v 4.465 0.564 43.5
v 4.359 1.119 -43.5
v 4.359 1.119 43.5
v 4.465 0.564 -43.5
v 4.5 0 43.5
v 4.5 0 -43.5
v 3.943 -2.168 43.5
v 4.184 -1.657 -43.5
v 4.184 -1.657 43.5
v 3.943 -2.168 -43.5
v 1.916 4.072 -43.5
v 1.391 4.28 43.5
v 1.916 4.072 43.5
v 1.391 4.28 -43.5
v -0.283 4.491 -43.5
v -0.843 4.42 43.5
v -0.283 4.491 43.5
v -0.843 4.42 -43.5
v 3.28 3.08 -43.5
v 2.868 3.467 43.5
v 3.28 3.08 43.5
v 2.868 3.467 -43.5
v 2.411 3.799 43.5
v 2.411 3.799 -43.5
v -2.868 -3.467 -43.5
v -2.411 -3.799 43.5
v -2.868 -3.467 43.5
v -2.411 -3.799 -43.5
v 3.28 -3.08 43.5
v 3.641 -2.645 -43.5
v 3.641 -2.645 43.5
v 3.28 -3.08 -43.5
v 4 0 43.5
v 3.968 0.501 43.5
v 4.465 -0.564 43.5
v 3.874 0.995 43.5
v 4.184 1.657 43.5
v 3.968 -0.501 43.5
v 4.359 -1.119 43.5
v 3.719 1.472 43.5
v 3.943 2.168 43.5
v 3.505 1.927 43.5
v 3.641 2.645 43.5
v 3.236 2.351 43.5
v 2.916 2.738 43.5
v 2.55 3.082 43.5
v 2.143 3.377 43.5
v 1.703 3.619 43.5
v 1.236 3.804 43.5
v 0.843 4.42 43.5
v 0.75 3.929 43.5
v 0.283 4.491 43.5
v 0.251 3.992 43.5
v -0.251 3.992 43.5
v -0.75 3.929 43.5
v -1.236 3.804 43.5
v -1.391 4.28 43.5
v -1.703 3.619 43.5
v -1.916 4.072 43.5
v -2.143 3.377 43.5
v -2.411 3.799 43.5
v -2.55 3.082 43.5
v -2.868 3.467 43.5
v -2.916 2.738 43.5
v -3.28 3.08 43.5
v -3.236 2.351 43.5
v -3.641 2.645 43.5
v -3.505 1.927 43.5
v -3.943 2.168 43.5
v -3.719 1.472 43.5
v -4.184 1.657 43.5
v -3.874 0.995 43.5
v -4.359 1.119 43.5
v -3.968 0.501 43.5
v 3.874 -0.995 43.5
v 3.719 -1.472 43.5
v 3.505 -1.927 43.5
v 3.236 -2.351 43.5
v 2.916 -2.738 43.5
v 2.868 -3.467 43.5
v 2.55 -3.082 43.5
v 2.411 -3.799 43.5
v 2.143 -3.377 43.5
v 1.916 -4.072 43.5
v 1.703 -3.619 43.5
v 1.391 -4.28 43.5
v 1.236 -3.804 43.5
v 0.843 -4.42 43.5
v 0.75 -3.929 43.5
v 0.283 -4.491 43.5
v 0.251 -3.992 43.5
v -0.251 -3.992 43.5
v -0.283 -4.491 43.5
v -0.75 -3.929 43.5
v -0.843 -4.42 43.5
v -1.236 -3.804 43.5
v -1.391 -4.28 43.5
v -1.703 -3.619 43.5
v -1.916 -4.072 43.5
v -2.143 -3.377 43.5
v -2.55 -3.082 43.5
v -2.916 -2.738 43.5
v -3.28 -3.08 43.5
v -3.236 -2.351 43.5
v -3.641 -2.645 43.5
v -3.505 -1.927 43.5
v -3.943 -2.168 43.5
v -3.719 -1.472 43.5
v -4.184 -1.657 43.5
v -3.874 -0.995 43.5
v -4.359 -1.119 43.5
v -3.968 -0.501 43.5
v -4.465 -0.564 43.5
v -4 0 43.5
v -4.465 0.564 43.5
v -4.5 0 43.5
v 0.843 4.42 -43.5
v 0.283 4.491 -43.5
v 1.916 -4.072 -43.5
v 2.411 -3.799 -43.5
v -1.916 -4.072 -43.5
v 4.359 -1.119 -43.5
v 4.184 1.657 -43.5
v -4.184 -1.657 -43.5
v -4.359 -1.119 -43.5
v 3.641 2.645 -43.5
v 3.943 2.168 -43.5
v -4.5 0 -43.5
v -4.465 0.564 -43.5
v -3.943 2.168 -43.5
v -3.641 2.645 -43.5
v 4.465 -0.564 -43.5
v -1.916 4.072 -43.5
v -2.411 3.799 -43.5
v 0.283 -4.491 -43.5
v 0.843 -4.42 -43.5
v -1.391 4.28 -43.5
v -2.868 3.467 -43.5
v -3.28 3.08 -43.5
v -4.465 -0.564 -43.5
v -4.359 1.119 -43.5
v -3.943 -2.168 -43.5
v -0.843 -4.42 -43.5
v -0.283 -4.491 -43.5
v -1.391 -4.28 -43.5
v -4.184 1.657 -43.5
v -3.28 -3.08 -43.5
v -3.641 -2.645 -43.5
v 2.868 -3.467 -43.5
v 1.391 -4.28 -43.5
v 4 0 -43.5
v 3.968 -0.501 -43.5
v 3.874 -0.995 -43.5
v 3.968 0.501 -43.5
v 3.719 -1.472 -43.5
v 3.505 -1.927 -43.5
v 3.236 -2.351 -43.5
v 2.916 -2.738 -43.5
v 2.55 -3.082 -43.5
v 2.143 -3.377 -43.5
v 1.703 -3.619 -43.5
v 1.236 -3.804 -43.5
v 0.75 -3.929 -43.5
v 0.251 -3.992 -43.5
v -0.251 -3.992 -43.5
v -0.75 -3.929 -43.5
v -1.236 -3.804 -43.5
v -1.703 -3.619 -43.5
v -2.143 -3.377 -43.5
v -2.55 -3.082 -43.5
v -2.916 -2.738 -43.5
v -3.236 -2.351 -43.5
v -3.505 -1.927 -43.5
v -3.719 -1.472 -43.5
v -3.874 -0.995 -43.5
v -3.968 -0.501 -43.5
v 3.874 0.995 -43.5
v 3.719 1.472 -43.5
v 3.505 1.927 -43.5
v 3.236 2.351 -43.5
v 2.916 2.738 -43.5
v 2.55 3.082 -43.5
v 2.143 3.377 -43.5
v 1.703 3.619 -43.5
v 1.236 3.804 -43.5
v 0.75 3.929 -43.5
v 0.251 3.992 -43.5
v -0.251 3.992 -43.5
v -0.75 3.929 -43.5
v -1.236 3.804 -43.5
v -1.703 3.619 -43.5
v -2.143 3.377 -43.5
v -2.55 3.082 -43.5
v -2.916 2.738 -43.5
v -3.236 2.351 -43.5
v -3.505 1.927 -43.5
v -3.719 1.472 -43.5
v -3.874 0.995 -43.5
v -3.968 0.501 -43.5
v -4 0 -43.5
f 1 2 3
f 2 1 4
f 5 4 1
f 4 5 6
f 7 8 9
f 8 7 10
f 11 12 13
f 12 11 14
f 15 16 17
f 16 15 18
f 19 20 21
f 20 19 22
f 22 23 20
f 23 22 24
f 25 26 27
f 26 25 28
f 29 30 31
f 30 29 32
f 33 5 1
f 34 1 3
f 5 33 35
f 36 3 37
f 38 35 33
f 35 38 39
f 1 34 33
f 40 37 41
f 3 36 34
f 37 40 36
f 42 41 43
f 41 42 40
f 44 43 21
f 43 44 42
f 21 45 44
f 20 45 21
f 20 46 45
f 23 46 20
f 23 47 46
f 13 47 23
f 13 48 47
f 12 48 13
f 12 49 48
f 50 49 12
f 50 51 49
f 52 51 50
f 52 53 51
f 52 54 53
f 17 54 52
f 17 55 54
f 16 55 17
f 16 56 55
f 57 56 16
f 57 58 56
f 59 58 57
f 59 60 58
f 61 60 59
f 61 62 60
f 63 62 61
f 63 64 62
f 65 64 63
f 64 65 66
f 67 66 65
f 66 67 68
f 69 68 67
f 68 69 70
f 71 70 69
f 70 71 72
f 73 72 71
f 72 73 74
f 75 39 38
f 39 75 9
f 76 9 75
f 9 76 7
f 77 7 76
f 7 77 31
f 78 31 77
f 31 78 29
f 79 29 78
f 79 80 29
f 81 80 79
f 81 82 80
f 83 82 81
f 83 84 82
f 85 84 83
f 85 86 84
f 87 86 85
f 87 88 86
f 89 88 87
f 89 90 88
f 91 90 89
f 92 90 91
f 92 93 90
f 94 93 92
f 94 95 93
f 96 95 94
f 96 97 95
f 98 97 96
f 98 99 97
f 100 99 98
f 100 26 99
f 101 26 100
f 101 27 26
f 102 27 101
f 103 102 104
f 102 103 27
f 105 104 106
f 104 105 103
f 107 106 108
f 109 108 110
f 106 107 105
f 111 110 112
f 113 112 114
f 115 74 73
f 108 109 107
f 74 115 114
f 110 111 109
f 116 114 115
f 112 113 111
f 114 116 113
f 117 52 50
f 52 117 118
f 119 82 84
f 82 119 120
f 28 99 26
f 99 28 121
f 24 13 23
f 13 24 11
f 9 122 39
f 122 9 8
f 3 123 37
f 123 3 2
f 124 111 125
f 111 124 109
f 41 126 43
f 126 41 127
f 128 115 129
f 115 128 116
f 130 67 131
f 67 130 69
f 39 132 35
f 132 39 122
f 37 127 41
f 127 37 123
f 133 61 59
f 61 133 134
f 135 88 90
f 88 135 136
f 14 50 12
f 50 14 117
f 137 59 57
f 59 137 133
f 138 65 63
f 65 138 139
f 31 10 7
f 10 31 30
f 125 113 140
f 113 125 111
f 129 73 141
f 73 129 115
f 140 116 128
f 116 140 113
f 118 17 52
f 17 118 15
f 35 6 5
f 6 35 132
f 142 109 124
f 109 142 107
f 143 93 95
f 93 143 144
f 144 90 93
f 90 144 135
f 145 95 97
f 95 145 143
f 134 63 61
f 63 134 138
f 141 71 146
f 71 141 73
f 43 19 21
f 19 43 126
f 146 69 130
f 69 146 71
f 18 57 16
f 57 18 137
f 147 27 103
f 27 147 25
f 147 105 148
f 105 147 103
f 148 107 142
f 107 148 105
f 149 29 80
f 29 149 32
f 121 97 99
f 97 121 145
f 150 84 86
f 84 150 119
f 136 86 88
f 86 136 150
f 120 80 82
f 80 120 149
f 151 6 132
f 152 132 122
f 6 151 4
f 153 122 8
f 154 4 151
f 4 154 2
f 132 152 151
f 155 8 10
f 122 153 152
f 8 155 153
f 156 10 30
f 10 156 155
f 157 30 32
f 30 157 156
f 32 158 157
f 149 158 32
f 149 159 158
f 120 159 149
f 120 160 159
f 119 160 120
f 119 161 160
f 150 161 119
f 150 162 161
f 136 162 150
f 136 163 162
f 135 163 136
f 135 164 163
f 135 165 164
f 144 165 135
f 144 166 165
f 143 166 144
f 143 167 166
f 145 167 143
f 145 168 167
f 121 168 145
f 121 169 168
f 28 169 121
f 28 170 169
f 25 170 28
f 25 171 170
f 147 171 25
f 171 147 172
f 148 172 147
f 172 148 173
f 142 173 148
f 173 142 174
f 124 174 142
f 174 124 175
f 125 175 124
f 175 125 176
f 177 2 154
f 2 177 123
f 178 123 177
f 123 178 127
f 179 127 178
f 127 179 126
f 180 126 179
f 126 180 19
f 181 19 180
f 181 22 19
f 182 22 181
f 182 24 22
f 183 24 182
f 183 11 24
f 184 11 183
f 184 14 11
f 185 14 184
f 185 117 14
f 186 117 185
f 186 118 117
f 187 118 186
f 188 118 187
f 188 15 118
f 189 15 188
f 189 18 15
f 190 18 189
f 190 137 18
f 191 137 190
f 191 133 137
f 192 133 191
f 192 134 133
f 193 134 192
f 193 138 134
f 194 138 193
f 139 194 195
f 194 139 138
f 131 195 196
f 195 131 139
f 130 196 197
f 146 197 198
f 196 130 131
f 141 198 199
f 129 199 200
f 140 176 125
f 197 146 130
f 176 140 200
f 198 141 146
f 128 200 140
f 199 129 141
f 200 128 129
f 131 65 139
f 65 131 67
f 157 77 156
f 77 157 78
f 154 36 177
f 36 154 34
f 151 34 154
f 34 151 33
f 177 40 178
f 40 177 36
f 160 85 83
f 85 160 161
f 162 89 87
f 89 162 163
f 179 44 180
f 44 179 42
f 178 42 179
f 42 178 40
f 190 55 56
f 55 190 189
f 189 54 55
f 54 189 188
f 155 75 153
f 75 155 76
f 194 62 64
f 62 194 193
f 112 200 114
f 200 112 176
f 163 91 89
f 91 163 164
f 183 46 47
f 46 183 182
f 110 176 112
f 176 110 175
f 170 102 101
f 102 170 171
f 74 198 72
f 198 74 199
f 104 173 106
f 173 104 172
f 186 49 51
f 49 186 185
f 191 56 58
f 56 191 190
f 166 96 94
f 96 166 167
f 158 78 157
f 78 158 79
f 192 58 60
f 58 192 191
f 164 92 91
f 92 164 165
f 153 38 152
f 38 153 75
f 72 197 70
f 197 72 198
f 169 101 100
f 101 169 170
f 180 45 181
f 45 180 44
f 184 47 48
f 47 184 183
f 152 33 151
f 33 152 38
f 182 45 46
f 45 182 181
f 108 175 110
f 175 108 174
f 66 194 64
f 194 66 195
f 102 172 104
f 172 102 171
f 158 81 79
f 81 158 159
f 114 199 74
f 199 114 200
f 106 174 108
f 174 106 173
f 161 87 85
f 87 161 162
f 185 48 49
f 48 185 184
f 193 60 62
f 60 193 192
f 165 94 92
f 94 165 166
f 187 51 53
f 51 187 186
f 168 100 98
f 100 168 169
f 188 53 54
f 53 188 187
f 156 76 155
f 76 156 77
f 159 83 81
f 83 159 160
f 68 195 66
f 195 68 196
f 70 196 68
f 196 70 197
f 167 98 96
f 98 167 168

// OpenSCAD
$fn = 50;


difference() {
	union() {
		translate(v = [0, 0, -43.5000000000]) {
			cylinder(h = 87, r = 4.5000000000);
		}
	}
	union() {
		translate(v = [0, 0, -100.0000000000]) {
			cylinder(h = 200, r = 4.0000000000);
		}
	}
}
